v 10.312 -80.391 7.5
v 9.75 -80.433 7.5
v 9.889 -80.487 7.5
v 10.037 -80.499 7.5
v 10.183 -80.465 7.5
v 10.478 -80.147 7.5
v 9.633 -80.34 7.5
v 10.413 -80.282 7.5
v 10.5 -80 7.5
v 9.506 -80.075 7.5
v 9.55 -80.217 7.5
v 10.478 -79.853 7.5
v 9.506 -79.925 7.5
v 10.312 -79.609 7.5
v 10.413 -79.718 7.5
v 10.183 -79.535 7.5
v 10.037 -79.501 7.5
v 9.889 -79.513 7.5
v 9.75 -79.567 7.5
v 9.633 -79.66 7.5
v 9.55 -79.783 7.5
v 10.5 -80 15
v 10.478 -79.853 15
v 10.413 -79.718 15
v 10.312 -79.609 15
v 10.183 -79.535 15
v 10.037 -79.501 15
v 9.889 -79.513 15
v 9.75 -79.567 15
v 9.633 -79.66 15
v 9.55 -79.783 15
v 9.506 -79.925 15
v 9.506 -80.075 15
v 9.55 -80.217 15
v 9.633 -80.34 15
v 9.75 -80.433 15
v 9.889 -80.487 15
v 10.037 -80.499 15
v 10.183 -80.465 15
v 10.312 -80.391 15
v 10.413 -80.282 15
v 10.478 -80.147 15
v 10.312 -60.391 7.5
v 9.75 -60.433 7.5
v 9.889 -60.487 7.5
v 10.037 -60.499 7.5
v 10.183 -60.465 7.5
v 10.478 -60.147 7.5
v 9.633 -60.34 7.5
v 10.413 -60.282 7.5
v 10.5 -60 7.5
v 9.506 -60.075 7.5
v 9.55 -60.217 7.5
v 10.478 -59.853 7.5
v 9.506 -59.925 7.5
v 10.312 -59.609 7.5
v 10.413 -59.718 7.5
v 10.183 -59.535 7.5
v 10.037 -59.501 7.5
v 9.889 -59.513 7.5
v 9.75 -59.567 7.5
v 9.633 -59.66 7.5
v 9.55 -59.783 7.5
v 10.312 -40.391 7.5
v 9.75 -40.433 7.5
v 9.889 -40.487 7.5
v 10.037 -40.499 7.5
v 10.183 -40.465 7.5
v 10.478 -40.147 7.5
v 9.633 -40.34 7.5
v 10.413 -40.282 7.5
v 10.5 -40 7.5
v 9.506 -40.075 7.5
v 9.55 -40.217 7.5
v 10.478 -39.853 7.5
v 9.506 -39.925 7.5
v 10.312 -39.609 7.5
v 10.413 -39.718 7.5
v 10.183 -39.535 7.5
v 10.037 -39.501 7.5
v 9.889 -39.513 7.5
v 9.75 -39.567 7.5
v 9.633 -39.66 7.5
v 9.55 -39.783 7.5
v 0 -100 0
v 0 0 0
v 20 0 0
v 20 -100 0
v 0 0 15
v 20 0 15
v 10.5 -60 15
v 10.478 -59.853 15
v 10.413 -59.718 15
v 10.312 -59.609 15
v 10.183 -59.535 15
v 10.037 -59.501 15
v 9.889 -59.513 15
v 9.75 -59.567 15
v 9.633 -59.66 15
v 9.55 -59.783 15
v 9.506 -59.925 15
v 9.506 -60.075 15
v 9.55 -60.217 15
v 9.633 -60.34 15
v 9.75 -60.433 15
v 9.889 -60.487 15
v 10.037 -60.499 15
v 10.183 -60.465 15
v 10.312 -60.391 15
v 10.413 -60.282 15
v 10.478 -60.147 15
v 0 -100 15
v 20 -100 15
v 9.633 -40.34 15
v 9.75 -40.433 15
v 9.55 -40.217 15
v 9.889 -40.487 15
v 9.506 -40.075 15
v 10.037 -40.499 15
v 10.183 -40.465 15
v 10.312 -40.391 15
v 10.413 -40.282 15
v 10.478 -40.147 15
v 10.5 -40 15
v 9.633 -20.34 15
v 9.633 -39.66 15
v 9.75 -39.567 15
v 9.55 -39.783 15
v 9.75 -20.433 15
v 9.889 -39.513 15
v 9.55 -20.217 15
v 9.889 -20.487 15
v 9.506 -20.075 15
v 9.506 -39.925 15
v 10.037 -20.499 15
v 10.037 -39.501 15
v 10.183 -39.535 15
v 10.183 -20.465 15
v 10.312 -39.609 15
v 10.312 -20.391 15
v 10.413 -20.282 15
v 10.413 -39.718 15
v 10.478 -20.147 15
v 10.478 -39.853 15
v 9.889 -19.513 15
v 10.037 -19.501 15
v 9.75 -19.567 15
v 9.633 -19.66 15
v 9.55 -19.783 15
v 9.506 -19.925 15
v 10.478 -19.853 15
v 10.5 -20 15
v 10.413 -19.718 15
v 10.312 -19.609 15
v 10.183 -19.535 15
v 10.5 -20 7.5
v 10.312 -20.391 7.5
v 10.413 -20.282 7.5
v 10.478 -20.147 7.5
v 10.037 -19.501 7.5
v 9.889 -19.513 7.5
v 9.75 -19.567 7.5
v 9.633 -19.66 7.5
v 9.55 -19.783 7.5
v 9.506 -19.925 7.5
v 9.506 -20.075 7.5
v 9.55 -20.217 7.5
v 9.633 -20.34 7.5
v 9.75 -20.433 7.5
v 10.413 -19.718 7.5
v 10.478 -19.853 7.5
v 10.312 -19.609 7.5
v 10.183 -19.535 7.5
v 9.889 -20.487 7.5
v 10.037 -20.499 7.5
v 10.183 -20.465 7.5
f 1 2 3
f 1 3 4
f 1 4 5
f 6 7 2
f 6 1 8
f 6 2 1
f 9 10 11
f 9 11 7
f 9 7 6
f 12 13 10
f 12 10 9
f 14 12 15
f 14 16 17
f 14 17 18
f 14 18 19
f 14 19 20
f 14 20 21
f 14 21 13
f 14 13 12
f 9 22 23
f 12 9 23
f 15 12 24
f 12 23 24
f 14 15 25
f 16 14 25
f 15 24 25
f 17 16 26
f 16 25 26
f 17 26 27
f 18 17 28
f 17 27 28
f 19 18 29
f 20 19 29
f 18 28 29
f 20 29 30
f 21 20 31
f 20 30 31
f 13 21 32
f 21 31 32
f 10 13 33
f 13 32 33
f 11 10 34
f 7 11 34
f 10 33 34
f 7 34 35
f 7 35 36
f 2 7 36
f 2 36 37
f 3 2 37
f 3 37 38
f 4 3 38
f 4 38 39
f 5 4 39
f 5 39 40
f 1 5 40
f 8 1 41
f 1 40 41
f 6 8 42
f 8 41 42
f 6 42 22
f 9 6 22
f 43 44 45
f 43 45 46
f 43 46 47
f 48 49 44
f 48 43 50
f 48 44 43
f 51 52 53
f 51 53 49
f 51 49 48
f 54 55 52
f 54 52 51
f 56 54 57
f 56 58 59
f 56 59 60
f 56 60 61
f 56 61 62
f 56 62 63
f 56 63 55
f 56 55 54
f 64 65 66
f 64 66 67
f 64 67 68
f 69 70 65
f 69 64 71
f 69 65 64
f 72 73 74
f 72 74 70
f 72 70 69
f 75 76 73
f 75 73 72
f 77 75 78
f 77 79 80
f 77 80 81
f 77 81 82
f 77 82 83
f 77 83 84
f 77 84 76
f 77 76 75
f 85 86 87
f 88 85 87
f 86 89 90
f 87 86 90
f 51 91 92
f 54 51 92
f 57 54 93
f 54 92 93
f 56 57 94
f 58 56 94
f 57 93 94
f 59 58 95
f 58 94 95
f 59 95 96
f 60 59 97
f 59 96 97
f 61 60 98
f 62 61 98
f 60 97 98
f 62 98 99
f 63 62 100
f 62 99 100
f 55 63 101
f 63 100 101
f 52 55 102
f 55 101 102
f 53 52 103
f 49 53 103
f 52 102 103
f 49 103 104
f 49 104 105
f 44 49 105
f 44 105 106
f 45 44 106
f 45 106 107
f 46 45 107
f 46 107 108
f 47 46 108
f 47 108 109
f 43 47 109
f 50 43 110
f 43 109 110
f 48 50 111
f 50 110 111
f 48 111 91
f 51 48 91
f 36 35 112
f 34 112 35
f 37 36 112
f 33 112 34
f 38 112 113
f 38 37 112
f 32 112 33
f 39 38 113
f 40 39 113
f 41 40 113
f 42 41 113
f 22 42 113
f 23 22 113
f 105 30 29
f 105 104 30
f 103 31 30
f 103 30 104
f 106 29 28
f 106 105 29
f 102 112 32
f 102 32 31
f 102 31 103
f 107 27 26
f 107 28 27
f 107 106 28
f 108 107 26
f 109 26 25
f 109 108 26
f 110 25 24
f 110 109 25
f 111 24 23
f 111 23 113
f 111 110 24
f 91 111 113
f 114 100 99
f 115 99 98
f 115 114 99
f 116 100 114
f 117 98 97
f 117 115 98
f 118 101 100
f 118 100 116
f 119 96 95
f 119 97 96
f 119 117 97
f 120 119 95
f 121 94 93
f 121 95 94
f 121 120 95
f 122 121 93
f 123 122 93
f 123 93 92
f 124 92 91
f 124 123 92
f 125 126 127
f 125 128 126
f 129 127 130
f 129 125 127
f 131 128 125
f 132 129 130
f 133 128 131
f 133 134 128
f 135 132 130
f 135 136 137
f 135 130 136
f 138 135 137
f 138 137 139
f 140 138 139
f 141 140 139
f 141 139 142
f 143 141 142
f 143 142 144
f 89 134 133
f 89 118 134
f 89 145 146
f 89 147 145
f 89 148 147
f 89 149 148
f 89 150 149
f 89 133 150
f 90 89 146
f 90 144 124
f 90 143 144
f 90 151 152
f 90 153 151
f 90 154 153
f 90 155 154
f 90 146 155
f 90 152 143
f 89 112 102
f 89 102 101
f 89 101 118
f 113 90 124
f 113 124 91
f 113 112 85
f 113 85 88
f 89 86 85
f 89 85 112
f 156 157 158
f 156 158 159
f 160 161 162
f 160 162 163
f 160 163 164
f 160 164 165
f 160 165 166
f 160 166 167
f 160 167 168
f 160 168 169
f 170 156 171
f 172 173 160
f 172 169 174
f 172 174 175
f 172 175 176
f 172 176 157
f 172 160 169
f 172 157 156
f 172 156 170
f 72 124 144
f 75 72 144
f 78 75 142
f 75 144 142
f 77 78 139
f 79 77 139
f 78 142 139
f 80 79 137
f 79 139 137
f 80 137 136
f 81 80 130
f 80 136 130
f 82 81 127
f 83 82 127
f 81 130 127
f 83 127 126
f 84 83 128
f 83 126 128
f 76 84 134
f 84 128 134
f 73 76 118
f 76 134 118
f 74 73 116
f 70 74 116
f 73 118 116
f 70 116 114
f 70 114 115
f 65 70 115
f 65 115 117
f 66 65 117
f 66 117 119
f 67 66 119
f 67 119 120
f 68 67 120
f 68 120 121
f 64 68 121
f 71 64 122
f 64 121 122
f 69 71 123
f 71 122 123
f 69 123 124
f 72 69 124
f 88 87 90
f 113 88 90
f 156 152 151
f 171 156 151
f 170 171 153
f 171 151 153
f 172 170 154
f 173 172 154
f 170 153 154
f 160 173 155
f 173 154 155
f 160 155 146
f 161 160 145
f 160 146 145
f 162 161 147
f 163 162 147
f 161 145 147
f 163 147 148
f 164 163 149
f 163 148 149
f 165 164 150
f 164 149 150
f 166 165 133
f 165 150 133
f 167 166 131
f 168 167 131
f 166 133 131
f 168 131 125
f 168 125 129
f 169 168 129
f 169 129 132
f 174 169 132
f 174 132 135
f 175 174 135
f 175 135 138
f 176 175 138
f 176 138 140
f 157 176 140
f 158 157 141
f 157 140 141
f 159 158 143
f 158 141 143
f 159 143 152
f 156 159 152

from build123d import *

# Parameters (mm, degrees)
F0_W     = 20
F0_H     = 15
F1_DEPTH = 100
F2_R     = 0.5
F3_DEPTH = 7.5


with BuildPart() as f1:
    # F0 (on Front) → F1 (new body)
    with BuildSketch(Plane.XZ):
        with Locations((10, 7.5)):
            Rectangle(F0_W, F0_H)
    extrude(amount=F1_DEPTH)

    # F2 (on face) → F3 (cut)
    with BuildSketch(Plane.XY.offset(15)):
        with Locations((10, -80)):
            Circle(F2_R)
        with Locations((10, -60)):
            Circle(F2_R)
        with Locations((10, -40)):
            Circle(F2_R)
        with Locations((10, -20)):
            Circle(F2_R)
    extrude(amount=-F3_DEPTH, mode=Mode.SUBTRACT)


solid = f1.part
